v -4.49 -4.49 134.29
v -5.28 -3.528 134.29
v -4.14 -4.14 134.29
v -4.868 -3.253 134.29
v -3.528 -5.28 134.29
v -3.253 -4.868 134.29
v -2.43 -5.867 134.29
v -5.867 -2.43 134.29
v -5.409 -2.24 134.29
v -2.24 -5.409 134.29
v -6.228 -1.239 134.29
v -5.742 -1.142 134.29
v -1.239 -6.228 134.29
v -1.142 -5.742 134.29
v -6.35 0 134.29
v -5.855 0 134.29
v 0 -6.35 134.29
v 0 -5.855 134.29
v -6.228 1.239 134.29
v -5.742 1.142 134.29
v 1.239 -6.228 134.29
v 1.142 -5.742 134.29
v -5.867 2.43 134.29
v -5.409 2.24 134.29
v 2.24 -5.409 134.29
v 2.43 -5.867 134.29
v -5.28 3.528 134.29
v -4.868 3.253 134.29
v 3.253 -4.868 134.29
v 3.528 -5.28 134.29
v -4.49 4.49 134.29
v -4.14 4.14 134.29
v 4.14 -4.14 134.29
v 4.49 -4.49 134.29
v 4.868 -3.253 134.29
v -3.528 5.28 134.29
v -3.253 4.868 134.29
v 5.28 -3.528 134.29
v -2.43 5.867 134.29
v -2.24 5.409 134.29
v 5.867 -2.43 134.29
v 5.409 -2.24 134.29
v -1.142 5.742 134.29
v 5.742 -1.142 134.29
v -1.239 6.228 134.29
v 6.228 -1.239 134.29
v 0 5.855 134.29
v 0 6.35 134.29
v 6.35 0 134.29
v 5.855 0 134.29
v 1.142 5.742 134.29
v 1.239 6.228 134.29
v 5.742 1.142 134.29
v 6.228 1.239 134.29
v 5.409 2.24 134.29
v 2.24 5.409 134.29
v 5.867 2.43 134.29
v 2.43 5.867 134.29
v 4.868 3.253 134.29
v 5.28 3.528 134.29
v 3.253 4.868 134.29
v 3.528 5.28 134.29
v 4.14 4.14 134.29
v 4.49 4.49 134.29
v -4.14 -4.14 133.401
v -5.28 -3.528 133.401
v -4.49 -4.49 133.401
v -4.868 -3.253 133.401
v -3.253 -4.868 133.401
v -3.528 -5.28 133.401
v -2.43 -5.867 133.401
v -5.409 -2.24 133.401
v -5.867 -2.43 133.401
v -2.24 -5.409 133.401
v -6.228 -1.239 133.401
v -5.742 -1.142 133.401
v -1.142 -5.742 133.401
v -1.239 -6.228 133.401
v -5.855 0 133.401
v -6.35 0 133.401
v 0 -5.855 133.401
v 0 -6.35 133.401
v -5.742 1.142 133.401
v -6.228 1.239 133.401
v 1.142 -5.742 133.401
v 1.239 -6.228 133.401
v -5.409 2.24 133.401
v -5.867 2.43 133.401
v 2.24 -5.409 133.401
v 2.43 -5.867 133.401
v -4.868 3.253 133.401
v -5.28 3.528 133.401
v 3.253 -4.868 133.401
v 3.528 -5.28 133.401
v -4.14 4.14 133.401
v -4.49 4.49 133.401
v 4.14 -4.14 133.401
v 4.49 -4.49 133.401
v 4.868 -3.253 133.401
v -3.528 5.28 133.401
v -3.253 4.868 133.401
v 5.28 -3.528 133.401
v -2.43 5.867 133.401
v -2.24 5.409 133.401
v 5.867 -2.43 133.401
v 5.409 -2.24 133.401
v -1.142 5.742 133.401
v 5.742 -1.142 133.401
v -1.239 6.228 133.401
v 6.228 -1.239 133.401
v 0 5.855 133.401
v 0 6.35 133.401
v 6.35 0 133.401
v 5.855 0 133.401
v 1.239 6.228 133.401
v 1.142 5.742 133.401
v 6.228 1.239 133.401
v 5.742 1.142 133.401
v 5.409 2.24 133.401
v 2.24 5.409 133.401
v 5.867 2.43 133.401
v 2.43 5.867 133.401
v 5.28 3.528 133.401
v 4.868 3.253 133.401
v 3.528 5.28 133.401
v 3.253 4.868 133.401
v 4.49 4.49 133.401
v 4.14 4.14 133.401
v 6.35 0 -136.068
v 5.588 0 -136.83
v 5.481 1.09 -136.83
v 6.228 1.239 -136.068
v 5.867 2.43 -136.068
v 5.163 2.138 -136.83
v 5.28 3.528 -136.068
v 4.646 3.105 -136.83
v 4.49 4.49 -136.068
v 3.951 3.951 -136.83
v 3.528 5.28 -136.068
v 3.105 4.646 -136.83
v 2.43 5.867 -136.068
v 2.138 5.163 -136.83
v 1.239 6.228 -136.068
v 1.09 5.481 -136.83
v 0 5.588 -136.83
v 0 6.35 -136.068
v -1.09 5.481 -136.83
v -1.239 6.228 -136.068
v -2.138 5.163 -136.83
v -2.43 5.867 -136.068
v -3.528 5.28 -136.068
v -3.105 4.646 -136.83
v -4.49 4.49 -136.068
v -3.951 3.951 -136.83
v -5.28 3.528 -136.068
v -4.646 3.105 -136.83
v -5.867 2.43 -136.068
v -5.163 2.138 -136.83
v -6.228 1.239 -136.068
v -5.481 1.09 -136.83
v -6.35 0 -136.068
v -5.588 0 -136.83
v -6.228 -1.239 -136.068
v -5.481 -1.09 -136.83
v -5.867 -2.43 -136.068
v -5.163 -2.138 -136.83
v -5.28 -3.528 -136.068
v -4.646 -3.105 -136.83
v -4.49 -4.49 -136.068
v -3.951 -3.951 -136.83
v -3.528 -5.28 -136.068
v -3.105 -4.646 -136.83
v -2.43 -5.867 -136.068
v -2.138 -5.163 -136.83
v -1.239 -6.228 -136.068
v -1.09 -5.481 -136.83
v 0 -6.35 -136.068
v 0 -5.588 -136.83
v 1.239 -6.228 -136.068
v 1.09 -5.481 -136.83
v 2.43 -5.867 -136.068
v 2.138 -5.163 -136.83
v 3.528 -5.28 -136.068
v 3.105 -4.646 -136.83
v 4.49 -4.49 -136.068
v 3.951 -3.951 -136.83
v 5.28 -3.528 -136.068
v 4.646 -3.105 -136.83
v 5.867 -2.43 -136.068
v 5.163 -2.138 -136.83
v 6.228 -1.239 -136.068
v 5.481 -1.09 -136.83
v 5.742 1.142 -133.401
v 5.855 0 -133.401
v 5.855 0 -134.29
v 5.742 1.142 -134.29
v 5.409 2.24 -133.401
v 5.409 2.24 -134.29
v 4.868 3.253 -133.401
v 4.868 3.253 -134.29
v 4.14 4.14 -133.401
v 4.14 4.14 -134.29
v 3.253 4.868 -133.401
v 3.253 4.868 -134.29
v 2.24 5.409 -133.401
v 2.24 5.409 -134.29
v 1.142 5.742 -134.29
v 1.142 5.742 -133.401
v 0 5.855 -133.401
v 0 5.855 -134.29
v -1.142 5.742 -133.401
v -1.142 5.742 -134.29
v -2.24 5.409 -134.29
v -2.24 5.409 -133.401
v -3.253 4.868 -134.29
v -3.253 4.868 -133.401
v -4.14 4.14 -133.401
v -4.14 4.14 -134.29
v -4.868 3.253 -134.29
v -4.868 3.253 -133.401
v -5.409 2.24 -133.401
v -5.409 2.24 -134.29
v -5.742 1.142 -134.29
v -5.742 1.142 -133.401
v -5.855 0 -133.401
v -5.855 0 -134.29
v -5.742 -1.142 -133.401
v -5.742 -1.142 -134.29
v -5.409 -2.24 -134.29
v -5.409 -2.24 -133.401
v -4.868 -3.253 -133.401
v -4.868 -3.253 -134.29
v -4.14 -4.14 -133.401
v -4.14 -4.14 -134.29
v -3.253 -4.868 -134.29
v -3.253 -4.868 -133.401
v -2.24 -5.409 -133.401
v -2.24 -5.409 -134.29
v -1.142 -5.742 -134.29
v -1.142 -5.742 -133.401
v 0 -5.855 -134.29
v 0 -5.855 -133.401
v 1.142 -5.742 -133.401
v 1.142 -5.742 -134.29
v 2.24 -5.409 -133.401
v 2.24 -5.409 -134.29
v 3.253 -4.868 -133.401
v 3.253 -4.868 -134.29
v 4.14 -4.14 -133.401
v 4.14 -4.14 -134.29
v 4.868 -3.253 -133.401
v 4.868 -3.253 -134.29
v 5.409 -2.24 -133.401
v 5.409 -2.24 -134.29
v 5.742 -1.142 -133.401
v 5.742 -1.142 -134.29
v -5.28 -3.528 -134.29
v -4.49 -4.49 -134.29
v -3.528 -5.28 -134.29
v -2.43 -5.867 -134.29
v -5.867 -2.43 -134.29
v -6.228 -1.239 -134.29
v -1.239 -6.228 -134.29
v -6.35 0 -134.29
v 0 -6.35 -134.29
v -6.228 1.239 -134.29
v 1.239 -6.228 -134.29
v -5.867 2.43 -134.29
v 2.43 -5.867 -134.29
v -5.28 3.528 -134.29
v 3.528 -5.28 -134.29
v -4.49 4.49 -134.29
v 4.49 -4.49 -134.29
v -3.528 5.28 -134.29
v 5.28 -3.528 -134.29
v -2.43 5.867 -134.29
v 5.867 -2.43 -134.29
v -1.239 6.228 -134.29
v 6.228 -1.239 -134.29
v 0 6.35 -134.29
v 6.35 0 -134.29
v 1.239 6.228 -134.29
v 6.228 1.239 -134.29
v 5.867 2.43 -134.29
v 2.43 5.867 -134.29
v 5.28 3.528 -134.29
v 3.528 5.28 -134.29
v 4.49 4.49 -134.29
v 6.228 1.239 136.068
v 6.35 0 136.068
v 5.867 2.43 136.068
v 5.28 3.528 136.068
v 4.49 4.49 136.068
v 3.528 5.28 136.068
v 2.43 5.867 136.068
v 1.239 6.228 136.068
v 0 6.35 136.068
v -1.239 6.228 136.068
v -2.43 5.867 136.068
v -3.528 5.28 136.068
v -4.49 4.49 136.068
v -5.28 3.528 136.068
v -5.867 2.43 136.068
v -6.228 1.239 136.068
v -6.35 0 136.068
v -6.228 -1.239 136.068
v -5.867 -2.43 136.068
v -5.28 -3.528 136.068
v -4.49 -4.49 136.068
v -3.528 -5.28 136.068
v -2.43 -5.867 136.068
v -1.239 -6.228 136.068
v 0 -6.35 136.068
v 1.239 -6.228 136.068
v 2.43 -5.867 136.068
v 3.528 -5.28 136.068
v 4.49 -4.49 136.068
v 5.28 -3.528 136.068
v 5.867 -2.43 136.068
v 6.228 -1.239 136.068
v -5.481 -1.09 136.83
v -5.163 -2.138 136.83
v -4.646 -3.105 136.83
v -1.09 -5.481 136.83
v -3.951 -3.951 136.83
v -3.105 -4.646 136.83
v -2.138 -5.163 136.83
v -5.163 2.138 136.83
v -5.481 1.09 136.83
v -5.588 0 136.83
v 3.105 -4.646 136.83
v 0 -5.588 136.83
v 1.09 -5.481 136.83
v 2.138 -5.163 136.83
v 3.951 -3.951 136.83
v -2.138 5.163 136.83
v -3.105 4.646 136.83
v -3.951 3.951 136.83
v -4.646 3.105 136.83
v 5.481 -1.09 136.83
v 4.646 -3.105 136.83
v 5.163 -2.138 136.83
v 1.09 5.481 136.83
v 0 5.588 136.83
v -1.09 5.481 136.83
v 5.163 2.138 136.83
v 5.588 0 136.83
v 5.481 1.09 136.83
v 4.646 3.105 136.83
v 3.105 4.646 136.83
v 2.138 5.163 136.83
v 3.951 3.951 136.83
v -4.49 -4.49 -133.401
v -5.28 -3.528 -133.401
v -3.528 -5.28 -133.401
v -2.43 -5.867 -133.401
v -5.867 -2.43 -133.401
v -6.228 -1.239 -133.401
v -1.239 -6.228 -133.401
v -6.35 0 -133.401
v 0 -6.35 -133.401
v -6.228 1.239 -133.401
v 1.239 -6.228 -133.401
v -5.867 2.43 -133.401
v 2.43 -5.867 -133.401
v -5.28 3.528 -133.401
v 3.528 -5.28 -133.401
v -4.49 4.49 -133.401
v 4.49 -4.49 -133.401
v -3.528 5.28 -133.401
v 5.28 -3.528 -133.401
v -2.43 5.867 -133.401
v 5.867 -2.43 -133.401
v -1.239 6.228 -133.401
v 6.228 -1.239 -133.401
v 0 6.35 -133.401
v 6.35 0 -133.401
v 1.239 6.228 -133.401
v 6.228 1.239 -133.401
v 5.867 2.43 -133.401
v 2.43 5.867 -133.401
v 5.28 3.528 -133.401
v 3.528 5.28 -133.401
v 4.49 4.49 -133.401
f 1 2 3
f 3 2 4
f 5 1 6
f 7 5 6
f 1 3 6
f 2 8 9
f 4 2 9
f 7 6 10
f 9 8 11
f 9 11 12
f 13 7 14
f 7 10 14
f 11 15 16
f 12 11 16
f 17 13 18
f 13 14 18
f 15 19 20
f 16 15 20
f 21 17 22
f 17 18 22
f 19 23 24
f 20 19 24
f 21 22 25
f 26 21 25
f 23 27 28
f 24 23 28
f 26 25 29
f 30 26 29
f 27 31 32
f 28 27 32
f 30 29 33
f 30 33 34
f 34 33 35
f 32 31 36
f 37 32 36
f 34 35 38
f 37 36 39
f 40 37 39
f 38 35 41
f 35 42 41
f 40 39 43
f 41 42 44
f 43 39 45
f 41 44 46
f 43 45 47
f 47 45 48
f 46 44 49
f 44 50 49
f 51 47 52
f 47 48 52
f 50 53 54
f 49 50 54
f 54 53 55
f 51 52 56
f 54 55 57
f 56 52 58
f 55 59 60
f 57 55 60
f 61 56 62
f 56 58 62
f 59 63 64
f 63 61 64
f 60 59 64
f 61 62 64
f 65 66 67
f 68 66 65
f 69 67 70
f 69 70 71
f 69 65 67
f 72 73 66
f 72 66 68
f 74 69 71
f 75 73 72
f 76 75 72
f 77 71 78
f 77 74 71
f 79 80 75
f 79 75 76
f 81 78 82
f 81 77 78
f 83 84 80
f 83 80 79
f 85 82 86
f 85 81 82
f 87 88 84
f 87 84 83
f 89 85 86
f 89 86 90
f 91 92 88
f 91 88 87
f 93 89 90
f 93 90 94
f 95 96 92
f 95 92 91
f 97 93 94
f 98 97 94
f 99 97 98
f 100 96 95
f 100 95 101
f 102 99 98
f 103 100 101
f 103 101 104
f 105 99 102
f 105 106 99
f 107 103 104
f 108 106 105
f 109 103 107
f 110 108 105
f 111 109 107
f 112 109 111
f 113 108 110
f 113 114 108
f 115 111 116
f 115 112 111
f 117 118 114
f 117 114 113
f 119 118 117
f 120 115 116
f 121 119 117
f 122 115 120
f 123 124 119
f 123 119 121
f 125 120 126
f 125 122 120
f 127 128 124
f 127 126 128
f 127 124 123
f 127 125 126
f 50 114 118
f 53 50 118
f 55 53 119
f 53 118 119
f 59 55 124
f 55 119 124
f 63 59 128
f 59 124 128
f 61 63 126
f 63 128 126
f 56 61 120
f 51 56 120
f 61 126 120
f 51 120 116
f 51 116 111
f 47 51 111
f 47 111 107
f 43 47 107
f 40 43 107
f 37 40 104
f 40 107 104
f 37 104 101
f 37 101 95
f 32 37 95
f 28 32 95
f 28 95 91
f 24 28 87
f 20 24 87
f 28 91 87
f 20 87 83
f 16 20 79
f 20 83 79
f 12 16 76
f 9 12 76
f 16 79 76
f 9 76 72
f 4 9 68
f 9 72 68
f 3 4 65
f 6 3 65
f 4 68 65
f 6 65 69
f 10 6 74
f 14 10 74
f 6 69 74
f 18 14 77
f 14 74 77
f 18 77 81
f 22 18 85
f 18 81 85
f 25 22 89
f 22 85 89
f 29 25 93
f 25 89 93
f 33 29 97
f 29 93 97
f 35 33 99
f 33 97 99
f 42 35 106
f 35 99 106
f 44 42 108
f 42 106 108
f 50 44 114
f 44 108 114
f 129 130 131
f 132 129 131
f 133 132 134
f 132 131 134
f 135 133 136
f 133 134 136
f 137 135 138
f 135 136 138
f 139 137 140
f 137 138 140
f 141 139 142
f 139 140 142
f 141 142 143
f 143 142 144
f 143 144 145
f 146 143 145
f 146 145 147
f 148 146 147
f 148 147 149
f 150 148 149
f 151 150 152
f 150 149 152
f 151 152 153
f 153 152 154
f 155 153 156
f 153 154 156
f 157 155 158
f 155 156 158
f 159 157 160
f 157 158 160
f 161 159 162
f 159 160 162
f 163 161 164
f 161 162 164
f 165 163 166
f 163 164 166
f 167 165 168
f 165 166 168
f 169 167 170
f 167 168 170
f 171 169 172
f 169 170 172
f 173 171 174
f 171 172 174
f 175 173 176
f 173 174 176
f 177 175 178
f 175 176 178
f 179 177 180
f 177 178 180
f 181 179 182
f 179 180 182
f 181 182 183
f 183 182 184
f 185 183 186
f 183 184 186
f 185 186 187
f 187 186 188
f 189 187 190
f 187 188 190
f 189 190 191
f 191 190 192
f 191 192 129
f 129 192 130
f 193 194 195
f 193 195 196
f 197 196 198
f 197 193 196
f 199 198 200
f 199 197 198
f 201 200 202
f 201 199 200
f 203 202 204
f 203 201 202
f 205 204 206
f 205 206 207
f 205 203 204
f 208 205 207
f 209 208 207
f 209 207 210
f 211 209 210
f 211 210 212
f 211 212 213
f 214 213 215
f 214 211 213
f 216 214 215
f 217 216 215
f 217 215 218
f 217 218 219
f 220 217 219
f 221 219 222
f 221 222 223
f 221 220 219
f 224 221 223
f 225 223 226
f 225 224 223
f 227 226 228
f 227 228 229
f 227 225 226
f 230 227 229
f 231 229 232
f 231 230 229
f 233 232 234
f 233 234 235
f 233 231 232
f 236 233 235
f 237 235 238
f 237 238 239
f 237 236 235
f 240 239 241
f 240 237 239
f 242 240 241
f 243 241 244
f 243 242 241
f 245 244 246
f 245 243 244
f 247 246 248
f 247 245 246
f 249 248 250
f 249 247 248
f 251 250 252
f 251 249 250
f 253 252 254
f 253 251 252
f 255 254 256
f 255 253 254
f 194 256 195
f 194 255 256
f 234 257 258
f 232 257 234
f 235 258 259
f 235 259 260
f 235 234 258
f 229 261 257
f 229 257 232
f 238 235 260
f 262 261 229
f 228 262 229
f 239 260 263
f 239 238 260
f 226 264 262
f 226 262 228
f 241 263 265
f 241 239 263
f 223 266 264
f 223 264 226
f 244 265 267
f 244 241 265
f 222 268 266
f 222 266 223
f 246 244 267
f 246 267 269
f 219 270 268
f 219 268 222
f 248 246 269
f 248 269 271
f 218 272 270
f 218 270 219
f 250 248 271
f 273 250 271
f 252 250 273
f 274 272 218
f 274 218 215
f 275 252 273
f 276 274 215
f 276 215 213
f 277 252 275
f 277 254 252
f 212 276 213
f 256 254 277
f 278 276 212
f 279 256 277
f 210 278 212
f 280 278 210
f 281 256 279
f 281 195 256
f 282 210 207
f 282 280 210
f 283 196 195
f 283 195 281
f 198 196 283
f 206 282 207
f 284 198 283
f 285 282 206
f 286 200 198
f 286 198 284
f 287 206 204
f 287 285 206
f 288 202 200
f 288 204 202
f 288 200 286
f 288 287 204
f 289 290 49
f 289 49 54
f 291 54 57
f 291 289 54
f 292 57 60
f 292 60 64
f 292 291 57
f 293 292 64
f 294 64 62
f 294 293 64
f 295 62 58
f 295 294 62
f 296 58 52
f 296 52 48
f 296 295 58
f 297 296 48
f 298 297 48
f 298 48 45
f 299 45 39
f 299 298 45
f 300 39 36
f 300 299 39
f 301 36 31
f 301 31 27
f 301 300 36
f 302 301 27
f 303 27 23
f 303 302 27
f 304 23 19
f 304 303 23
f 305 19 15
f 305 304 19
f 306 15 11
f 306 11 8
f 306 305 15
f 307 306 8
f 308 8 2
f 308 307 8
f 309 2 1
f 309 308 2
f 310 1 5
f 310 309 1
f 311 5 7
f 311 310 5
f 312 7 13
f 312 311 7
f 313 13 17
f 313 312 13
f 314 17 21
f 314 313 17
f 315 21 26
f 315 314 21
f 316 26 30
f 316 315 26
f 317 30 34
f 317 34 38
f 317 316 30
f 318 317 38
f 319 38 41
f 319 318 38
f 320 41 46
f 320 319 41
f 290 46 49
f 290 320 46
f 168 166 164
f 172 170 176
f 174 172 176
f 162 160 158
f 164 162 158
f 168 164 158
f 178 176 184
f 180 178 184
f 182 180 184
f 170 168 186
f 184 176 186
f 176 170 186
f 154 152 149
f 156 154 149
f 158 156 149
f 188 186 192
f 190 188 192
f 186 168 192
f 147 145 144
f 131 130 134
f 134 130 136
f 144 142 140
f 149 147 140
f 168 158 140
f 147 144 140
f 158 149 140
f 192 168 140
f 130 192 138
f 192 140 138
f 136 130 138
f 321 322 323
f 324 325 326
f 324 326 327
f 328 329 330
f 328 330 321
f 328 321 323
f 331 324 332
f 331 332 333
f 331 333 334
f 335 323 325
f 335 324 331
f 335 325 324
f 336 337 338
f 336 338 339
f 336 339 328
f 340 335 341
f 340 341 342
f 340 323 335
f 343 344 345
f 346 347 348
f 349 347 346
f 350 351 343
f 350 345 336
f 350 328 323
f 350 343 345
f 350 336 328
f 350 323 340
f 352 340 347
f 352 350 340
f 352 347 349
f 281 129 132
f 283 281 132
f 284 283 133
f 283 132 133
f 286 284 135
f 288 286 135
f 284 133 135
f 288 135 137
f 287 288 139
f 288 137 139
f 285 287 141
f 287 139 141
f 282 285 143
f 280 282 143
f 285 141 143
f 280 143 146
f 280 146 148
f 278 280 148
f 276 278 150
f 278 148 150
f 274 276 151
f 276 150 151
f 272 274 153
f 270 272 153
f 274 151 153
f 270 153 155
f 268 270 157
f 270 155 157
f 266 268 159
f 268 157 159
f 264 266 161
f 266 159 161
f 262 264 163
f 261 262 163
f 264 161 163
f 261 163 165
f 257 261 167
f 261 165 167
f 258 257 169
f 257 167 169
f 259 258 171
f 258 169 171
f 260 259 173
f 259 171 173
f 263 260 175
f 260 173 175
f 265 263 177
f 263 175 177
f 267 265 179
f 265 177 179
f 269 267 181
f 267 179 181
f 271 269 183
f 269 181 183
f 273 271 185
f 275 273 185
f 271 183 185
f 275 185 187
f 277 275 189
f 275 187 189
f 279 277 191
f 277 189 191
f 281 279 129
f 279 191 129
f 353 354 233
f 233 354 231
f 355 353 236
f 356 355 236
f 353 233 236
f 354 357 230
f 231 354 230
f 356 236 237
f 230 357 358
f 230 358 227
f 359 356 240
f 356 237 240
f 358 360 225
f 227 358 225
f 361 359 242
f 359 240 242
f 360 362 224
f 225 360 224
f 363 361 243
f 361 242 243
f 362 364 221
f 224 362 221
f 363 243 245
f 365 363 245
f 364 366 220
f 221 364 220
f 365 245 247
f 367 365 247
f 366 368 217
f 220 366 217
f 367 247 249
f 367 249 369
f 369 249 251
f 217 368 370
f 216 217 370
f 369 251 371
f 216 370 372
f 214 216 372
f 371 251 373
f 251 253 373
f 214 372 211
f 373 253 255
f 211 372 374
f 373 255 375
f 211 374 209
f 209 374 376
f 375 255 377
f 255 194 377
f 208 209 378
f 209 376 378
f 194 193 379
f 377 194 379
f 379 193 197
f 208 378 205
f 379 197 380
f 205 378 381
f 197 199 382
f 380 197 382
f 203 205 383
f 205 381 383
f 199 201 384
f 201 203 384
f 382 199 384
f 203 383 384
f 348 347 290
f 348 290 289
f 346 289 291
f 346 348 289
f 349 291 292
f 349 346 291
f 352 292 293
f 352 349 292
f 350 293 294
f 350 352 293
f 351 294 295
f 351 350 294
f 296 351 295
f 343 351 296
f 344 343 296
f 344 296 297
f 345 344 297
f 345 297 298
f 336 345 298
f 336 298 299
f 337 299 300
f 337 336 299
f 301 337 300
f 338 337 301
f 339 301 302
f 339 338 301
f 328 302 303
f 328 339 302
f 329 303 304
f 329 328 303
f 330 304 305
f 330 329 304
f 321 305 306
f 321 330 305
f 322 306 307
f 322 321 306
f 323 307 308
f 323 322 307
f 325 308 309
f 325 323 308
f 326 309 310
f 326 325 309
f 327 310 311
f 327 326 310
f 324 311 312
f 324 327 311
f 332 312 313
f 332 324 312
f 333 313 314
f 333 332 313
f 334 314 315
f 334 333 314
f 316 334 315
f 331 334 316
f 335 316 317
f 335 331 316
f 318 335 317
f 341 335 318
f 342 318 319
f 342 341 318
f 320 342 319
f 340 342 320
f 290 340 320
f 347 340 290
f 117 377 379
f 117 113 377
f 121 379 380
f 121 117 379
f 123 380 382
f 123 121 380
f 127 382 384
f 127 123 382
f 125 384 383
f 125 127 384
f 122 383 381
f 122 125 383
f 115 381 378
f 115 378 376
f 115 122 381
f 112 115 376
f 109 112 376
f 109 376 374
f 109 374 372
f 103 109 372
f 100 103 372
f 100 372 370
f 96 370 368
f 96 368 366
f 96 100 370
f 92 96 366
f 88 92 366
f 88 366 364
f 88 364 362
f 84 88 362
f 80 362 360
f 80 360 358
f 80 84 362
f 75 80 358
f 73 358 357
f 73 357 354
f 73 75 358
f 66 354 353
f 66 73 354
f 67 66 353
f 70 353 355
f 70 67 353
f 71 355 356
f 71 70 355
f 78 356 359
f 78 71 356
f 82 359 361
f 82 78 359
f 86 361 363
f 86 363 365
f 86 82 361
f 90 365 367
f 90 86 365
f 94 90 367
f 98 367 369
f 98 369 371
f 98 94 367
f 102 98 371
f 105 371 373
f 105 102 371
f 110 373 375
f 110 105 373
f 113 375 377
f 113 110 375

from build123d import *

# Parameters (mm, degrees)
SKETCH1_R                = 6.35
BOSS_EXTRUDE1_DEPTH      = 133.4008
SKETCH2_R                = 5.8547
BOSS_EXTRUDE2_DEPTH      = 0.889
BOSS_EXTRUDE3_START      = 2.54
SKETCH3_R                = 6.35
BOSS_EXTRUDE3_DEPTH      = 2.54
CHAMFER1_SIZE            = 0.762
CHAMFER1_OF_MIRROR1_SIZE = 0.762


with BuildPart() as part:
    # Sketch1 → Boss-Extrude1 (new, symmetric)
    with BuildSketch(Plane.XY):
        Circle(SKETCH1_R)
    extrude(amount=BOSS_EXTRUDE1_DEPTH, both=True)

    # Sketch2 → Boss-Extrude2 (add)
    with BuildSketch(Plane.XY.offset(133.4008)):
        Circle(SKETCH2_R)
    boss_extrude2 = extrude(amount=BOSS_EXTRUDE2_DEPTH)

    # Sketch3 → Boss-Extrude3 (add)
    with BuildSketch(Plane.XY.offset(134.2898).offset(BOSS_EXTRUDE3_START)):
        Circle(SKETCH3_R)
    boss_extrude3 = extrude(amount=-BOSS_EXTRUDE3_DEPTH)

    # Chamfer1
    chamfer1_edges = [part.edges().sort_by_distance(p)[0] for p in [
        (-6.35, 0, 136.8298),
    ]]
    chamfer(chamfer1_edges, length=CHAMFER1_SIZE)

    # Mirror1: Boss-Extrude2, Boss-Extrude3 across plane
    add(boss_extrude2.mirror(Plane.XY))
    add(boss_extrude3.mirror(Plane.XY))

    # Chamfer1 of Mirror1
    chamfer1_of_mirror1_edges = [part.edges().sort_by_distance(p)[0] for p in [
        (-6.35, 0, -136.8298),
    ]]
    chamfer(chamfer1_of_mirror1_edges, length=CHAMFER1_OF_MIRROR1_SIZE)


solid = part.part
